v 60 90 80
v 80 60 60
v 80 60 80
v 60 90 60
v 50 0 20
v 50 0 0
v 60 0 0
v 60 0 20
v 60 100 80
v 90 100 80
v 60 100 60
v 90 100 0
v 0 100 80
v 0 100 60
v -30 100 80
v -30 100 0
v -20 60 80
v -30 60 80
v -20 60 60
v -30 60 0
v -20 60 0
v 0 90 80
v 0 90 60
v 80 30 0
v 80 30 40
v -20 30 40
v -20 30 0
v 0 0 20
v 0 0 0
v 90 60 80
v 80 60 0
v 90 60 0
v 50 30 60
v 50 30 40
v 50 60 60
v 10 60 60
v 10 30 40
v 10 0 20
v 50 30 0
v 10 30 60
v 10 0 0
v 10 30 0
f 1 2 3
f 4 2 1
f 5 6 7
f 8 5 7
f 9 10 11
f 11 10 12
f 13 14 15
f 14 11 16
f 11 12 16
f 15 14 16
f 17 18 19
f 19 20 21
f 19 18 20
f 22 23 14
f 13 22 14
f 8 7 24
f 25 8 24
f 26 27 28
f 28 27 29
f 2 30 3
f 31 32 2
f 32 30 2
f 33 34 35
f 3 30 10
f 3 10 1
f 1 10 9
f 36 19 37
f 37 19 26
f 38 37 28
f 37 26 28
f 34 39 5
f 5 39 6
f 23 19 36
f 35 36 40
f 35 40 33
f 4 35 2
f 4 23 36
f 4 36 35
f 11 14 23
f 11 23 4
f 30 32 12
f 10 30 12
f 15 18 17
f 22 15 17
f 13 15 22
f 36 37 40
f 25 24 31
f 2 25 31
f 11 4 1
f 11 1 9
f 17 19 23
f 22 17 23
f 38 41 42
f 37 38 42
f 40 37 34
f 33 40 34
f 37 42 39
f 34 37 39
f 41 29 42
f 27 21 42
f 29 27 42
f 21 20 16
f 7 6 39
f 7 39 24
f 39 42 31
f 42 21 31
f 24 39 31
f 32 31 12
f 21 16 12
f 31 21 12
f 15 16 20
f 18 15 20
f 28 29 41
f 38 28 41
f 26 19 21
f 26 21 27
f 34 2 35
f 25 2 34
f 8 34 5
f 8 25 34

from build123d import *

# Parameters (mm, degrees)
BOSS_EXTRUDE1_DEPTH = 60
BOSS_EXTRUDE2_DEPTH = 20
CUT_EXTRUDE1_DEPTH  = 30
CUT_EXTRUDE2_DEPTH  = 30


with BuildPart() as part:
    # Sketch1 → Boss-Extrude1 (new body)
    with BuildSketch(Plane.XY):
        Polygon((0, 0), (10, 0), (10, 30), (50, 30), (50, 0), (60, 0), (80, 30), (80, 60), (90, 60), (90, 100), (-30, 100), (-30, 60), (-20, 60), (-20, 30), align=None)
    extrude(amount=BOSS_EXTRUDE1_DEPTH)

    # Sketch2 → Boss-Extrude2 (add)
    with BuildSketch(Plane.XY.offset(60)):
        Polygon((-20, 60), (0, 90), (0, 100), (-30, 100), (-30, 60), align=None)
        Polygon((80, 60), (60, 90), (60, 100), (90, 100), (90, 60), align=None)
    extrude(amount=BOSS_EXTRUDE2_DEPTH)

    # Sketch3 → Cut-Extrude1 (cut)
    with BuildSketch(Plane.ZY.offset(20)):
        Polygon((60, 60), (20, 0), (60, 0), align=None)
    extrude(amount=-CUT_EXTRUDE1_DEPTH, mode=Mode.SUBTRACT)

    # Sketch4 → Cut-Extrude2 (cut)
    with BuildSketch(Plane(origin=(80, 0, 0), x_dir=(0, 0, -1), z_dir=(1, 0, 0))):
        Polygon((-60, 60), (-20, 0), (-60, 0), align=None)
    extrude(amount=-CUT_EXTRUDE2_DEPTH, mode=Mode.SUBTRACT)


solid = part.part
